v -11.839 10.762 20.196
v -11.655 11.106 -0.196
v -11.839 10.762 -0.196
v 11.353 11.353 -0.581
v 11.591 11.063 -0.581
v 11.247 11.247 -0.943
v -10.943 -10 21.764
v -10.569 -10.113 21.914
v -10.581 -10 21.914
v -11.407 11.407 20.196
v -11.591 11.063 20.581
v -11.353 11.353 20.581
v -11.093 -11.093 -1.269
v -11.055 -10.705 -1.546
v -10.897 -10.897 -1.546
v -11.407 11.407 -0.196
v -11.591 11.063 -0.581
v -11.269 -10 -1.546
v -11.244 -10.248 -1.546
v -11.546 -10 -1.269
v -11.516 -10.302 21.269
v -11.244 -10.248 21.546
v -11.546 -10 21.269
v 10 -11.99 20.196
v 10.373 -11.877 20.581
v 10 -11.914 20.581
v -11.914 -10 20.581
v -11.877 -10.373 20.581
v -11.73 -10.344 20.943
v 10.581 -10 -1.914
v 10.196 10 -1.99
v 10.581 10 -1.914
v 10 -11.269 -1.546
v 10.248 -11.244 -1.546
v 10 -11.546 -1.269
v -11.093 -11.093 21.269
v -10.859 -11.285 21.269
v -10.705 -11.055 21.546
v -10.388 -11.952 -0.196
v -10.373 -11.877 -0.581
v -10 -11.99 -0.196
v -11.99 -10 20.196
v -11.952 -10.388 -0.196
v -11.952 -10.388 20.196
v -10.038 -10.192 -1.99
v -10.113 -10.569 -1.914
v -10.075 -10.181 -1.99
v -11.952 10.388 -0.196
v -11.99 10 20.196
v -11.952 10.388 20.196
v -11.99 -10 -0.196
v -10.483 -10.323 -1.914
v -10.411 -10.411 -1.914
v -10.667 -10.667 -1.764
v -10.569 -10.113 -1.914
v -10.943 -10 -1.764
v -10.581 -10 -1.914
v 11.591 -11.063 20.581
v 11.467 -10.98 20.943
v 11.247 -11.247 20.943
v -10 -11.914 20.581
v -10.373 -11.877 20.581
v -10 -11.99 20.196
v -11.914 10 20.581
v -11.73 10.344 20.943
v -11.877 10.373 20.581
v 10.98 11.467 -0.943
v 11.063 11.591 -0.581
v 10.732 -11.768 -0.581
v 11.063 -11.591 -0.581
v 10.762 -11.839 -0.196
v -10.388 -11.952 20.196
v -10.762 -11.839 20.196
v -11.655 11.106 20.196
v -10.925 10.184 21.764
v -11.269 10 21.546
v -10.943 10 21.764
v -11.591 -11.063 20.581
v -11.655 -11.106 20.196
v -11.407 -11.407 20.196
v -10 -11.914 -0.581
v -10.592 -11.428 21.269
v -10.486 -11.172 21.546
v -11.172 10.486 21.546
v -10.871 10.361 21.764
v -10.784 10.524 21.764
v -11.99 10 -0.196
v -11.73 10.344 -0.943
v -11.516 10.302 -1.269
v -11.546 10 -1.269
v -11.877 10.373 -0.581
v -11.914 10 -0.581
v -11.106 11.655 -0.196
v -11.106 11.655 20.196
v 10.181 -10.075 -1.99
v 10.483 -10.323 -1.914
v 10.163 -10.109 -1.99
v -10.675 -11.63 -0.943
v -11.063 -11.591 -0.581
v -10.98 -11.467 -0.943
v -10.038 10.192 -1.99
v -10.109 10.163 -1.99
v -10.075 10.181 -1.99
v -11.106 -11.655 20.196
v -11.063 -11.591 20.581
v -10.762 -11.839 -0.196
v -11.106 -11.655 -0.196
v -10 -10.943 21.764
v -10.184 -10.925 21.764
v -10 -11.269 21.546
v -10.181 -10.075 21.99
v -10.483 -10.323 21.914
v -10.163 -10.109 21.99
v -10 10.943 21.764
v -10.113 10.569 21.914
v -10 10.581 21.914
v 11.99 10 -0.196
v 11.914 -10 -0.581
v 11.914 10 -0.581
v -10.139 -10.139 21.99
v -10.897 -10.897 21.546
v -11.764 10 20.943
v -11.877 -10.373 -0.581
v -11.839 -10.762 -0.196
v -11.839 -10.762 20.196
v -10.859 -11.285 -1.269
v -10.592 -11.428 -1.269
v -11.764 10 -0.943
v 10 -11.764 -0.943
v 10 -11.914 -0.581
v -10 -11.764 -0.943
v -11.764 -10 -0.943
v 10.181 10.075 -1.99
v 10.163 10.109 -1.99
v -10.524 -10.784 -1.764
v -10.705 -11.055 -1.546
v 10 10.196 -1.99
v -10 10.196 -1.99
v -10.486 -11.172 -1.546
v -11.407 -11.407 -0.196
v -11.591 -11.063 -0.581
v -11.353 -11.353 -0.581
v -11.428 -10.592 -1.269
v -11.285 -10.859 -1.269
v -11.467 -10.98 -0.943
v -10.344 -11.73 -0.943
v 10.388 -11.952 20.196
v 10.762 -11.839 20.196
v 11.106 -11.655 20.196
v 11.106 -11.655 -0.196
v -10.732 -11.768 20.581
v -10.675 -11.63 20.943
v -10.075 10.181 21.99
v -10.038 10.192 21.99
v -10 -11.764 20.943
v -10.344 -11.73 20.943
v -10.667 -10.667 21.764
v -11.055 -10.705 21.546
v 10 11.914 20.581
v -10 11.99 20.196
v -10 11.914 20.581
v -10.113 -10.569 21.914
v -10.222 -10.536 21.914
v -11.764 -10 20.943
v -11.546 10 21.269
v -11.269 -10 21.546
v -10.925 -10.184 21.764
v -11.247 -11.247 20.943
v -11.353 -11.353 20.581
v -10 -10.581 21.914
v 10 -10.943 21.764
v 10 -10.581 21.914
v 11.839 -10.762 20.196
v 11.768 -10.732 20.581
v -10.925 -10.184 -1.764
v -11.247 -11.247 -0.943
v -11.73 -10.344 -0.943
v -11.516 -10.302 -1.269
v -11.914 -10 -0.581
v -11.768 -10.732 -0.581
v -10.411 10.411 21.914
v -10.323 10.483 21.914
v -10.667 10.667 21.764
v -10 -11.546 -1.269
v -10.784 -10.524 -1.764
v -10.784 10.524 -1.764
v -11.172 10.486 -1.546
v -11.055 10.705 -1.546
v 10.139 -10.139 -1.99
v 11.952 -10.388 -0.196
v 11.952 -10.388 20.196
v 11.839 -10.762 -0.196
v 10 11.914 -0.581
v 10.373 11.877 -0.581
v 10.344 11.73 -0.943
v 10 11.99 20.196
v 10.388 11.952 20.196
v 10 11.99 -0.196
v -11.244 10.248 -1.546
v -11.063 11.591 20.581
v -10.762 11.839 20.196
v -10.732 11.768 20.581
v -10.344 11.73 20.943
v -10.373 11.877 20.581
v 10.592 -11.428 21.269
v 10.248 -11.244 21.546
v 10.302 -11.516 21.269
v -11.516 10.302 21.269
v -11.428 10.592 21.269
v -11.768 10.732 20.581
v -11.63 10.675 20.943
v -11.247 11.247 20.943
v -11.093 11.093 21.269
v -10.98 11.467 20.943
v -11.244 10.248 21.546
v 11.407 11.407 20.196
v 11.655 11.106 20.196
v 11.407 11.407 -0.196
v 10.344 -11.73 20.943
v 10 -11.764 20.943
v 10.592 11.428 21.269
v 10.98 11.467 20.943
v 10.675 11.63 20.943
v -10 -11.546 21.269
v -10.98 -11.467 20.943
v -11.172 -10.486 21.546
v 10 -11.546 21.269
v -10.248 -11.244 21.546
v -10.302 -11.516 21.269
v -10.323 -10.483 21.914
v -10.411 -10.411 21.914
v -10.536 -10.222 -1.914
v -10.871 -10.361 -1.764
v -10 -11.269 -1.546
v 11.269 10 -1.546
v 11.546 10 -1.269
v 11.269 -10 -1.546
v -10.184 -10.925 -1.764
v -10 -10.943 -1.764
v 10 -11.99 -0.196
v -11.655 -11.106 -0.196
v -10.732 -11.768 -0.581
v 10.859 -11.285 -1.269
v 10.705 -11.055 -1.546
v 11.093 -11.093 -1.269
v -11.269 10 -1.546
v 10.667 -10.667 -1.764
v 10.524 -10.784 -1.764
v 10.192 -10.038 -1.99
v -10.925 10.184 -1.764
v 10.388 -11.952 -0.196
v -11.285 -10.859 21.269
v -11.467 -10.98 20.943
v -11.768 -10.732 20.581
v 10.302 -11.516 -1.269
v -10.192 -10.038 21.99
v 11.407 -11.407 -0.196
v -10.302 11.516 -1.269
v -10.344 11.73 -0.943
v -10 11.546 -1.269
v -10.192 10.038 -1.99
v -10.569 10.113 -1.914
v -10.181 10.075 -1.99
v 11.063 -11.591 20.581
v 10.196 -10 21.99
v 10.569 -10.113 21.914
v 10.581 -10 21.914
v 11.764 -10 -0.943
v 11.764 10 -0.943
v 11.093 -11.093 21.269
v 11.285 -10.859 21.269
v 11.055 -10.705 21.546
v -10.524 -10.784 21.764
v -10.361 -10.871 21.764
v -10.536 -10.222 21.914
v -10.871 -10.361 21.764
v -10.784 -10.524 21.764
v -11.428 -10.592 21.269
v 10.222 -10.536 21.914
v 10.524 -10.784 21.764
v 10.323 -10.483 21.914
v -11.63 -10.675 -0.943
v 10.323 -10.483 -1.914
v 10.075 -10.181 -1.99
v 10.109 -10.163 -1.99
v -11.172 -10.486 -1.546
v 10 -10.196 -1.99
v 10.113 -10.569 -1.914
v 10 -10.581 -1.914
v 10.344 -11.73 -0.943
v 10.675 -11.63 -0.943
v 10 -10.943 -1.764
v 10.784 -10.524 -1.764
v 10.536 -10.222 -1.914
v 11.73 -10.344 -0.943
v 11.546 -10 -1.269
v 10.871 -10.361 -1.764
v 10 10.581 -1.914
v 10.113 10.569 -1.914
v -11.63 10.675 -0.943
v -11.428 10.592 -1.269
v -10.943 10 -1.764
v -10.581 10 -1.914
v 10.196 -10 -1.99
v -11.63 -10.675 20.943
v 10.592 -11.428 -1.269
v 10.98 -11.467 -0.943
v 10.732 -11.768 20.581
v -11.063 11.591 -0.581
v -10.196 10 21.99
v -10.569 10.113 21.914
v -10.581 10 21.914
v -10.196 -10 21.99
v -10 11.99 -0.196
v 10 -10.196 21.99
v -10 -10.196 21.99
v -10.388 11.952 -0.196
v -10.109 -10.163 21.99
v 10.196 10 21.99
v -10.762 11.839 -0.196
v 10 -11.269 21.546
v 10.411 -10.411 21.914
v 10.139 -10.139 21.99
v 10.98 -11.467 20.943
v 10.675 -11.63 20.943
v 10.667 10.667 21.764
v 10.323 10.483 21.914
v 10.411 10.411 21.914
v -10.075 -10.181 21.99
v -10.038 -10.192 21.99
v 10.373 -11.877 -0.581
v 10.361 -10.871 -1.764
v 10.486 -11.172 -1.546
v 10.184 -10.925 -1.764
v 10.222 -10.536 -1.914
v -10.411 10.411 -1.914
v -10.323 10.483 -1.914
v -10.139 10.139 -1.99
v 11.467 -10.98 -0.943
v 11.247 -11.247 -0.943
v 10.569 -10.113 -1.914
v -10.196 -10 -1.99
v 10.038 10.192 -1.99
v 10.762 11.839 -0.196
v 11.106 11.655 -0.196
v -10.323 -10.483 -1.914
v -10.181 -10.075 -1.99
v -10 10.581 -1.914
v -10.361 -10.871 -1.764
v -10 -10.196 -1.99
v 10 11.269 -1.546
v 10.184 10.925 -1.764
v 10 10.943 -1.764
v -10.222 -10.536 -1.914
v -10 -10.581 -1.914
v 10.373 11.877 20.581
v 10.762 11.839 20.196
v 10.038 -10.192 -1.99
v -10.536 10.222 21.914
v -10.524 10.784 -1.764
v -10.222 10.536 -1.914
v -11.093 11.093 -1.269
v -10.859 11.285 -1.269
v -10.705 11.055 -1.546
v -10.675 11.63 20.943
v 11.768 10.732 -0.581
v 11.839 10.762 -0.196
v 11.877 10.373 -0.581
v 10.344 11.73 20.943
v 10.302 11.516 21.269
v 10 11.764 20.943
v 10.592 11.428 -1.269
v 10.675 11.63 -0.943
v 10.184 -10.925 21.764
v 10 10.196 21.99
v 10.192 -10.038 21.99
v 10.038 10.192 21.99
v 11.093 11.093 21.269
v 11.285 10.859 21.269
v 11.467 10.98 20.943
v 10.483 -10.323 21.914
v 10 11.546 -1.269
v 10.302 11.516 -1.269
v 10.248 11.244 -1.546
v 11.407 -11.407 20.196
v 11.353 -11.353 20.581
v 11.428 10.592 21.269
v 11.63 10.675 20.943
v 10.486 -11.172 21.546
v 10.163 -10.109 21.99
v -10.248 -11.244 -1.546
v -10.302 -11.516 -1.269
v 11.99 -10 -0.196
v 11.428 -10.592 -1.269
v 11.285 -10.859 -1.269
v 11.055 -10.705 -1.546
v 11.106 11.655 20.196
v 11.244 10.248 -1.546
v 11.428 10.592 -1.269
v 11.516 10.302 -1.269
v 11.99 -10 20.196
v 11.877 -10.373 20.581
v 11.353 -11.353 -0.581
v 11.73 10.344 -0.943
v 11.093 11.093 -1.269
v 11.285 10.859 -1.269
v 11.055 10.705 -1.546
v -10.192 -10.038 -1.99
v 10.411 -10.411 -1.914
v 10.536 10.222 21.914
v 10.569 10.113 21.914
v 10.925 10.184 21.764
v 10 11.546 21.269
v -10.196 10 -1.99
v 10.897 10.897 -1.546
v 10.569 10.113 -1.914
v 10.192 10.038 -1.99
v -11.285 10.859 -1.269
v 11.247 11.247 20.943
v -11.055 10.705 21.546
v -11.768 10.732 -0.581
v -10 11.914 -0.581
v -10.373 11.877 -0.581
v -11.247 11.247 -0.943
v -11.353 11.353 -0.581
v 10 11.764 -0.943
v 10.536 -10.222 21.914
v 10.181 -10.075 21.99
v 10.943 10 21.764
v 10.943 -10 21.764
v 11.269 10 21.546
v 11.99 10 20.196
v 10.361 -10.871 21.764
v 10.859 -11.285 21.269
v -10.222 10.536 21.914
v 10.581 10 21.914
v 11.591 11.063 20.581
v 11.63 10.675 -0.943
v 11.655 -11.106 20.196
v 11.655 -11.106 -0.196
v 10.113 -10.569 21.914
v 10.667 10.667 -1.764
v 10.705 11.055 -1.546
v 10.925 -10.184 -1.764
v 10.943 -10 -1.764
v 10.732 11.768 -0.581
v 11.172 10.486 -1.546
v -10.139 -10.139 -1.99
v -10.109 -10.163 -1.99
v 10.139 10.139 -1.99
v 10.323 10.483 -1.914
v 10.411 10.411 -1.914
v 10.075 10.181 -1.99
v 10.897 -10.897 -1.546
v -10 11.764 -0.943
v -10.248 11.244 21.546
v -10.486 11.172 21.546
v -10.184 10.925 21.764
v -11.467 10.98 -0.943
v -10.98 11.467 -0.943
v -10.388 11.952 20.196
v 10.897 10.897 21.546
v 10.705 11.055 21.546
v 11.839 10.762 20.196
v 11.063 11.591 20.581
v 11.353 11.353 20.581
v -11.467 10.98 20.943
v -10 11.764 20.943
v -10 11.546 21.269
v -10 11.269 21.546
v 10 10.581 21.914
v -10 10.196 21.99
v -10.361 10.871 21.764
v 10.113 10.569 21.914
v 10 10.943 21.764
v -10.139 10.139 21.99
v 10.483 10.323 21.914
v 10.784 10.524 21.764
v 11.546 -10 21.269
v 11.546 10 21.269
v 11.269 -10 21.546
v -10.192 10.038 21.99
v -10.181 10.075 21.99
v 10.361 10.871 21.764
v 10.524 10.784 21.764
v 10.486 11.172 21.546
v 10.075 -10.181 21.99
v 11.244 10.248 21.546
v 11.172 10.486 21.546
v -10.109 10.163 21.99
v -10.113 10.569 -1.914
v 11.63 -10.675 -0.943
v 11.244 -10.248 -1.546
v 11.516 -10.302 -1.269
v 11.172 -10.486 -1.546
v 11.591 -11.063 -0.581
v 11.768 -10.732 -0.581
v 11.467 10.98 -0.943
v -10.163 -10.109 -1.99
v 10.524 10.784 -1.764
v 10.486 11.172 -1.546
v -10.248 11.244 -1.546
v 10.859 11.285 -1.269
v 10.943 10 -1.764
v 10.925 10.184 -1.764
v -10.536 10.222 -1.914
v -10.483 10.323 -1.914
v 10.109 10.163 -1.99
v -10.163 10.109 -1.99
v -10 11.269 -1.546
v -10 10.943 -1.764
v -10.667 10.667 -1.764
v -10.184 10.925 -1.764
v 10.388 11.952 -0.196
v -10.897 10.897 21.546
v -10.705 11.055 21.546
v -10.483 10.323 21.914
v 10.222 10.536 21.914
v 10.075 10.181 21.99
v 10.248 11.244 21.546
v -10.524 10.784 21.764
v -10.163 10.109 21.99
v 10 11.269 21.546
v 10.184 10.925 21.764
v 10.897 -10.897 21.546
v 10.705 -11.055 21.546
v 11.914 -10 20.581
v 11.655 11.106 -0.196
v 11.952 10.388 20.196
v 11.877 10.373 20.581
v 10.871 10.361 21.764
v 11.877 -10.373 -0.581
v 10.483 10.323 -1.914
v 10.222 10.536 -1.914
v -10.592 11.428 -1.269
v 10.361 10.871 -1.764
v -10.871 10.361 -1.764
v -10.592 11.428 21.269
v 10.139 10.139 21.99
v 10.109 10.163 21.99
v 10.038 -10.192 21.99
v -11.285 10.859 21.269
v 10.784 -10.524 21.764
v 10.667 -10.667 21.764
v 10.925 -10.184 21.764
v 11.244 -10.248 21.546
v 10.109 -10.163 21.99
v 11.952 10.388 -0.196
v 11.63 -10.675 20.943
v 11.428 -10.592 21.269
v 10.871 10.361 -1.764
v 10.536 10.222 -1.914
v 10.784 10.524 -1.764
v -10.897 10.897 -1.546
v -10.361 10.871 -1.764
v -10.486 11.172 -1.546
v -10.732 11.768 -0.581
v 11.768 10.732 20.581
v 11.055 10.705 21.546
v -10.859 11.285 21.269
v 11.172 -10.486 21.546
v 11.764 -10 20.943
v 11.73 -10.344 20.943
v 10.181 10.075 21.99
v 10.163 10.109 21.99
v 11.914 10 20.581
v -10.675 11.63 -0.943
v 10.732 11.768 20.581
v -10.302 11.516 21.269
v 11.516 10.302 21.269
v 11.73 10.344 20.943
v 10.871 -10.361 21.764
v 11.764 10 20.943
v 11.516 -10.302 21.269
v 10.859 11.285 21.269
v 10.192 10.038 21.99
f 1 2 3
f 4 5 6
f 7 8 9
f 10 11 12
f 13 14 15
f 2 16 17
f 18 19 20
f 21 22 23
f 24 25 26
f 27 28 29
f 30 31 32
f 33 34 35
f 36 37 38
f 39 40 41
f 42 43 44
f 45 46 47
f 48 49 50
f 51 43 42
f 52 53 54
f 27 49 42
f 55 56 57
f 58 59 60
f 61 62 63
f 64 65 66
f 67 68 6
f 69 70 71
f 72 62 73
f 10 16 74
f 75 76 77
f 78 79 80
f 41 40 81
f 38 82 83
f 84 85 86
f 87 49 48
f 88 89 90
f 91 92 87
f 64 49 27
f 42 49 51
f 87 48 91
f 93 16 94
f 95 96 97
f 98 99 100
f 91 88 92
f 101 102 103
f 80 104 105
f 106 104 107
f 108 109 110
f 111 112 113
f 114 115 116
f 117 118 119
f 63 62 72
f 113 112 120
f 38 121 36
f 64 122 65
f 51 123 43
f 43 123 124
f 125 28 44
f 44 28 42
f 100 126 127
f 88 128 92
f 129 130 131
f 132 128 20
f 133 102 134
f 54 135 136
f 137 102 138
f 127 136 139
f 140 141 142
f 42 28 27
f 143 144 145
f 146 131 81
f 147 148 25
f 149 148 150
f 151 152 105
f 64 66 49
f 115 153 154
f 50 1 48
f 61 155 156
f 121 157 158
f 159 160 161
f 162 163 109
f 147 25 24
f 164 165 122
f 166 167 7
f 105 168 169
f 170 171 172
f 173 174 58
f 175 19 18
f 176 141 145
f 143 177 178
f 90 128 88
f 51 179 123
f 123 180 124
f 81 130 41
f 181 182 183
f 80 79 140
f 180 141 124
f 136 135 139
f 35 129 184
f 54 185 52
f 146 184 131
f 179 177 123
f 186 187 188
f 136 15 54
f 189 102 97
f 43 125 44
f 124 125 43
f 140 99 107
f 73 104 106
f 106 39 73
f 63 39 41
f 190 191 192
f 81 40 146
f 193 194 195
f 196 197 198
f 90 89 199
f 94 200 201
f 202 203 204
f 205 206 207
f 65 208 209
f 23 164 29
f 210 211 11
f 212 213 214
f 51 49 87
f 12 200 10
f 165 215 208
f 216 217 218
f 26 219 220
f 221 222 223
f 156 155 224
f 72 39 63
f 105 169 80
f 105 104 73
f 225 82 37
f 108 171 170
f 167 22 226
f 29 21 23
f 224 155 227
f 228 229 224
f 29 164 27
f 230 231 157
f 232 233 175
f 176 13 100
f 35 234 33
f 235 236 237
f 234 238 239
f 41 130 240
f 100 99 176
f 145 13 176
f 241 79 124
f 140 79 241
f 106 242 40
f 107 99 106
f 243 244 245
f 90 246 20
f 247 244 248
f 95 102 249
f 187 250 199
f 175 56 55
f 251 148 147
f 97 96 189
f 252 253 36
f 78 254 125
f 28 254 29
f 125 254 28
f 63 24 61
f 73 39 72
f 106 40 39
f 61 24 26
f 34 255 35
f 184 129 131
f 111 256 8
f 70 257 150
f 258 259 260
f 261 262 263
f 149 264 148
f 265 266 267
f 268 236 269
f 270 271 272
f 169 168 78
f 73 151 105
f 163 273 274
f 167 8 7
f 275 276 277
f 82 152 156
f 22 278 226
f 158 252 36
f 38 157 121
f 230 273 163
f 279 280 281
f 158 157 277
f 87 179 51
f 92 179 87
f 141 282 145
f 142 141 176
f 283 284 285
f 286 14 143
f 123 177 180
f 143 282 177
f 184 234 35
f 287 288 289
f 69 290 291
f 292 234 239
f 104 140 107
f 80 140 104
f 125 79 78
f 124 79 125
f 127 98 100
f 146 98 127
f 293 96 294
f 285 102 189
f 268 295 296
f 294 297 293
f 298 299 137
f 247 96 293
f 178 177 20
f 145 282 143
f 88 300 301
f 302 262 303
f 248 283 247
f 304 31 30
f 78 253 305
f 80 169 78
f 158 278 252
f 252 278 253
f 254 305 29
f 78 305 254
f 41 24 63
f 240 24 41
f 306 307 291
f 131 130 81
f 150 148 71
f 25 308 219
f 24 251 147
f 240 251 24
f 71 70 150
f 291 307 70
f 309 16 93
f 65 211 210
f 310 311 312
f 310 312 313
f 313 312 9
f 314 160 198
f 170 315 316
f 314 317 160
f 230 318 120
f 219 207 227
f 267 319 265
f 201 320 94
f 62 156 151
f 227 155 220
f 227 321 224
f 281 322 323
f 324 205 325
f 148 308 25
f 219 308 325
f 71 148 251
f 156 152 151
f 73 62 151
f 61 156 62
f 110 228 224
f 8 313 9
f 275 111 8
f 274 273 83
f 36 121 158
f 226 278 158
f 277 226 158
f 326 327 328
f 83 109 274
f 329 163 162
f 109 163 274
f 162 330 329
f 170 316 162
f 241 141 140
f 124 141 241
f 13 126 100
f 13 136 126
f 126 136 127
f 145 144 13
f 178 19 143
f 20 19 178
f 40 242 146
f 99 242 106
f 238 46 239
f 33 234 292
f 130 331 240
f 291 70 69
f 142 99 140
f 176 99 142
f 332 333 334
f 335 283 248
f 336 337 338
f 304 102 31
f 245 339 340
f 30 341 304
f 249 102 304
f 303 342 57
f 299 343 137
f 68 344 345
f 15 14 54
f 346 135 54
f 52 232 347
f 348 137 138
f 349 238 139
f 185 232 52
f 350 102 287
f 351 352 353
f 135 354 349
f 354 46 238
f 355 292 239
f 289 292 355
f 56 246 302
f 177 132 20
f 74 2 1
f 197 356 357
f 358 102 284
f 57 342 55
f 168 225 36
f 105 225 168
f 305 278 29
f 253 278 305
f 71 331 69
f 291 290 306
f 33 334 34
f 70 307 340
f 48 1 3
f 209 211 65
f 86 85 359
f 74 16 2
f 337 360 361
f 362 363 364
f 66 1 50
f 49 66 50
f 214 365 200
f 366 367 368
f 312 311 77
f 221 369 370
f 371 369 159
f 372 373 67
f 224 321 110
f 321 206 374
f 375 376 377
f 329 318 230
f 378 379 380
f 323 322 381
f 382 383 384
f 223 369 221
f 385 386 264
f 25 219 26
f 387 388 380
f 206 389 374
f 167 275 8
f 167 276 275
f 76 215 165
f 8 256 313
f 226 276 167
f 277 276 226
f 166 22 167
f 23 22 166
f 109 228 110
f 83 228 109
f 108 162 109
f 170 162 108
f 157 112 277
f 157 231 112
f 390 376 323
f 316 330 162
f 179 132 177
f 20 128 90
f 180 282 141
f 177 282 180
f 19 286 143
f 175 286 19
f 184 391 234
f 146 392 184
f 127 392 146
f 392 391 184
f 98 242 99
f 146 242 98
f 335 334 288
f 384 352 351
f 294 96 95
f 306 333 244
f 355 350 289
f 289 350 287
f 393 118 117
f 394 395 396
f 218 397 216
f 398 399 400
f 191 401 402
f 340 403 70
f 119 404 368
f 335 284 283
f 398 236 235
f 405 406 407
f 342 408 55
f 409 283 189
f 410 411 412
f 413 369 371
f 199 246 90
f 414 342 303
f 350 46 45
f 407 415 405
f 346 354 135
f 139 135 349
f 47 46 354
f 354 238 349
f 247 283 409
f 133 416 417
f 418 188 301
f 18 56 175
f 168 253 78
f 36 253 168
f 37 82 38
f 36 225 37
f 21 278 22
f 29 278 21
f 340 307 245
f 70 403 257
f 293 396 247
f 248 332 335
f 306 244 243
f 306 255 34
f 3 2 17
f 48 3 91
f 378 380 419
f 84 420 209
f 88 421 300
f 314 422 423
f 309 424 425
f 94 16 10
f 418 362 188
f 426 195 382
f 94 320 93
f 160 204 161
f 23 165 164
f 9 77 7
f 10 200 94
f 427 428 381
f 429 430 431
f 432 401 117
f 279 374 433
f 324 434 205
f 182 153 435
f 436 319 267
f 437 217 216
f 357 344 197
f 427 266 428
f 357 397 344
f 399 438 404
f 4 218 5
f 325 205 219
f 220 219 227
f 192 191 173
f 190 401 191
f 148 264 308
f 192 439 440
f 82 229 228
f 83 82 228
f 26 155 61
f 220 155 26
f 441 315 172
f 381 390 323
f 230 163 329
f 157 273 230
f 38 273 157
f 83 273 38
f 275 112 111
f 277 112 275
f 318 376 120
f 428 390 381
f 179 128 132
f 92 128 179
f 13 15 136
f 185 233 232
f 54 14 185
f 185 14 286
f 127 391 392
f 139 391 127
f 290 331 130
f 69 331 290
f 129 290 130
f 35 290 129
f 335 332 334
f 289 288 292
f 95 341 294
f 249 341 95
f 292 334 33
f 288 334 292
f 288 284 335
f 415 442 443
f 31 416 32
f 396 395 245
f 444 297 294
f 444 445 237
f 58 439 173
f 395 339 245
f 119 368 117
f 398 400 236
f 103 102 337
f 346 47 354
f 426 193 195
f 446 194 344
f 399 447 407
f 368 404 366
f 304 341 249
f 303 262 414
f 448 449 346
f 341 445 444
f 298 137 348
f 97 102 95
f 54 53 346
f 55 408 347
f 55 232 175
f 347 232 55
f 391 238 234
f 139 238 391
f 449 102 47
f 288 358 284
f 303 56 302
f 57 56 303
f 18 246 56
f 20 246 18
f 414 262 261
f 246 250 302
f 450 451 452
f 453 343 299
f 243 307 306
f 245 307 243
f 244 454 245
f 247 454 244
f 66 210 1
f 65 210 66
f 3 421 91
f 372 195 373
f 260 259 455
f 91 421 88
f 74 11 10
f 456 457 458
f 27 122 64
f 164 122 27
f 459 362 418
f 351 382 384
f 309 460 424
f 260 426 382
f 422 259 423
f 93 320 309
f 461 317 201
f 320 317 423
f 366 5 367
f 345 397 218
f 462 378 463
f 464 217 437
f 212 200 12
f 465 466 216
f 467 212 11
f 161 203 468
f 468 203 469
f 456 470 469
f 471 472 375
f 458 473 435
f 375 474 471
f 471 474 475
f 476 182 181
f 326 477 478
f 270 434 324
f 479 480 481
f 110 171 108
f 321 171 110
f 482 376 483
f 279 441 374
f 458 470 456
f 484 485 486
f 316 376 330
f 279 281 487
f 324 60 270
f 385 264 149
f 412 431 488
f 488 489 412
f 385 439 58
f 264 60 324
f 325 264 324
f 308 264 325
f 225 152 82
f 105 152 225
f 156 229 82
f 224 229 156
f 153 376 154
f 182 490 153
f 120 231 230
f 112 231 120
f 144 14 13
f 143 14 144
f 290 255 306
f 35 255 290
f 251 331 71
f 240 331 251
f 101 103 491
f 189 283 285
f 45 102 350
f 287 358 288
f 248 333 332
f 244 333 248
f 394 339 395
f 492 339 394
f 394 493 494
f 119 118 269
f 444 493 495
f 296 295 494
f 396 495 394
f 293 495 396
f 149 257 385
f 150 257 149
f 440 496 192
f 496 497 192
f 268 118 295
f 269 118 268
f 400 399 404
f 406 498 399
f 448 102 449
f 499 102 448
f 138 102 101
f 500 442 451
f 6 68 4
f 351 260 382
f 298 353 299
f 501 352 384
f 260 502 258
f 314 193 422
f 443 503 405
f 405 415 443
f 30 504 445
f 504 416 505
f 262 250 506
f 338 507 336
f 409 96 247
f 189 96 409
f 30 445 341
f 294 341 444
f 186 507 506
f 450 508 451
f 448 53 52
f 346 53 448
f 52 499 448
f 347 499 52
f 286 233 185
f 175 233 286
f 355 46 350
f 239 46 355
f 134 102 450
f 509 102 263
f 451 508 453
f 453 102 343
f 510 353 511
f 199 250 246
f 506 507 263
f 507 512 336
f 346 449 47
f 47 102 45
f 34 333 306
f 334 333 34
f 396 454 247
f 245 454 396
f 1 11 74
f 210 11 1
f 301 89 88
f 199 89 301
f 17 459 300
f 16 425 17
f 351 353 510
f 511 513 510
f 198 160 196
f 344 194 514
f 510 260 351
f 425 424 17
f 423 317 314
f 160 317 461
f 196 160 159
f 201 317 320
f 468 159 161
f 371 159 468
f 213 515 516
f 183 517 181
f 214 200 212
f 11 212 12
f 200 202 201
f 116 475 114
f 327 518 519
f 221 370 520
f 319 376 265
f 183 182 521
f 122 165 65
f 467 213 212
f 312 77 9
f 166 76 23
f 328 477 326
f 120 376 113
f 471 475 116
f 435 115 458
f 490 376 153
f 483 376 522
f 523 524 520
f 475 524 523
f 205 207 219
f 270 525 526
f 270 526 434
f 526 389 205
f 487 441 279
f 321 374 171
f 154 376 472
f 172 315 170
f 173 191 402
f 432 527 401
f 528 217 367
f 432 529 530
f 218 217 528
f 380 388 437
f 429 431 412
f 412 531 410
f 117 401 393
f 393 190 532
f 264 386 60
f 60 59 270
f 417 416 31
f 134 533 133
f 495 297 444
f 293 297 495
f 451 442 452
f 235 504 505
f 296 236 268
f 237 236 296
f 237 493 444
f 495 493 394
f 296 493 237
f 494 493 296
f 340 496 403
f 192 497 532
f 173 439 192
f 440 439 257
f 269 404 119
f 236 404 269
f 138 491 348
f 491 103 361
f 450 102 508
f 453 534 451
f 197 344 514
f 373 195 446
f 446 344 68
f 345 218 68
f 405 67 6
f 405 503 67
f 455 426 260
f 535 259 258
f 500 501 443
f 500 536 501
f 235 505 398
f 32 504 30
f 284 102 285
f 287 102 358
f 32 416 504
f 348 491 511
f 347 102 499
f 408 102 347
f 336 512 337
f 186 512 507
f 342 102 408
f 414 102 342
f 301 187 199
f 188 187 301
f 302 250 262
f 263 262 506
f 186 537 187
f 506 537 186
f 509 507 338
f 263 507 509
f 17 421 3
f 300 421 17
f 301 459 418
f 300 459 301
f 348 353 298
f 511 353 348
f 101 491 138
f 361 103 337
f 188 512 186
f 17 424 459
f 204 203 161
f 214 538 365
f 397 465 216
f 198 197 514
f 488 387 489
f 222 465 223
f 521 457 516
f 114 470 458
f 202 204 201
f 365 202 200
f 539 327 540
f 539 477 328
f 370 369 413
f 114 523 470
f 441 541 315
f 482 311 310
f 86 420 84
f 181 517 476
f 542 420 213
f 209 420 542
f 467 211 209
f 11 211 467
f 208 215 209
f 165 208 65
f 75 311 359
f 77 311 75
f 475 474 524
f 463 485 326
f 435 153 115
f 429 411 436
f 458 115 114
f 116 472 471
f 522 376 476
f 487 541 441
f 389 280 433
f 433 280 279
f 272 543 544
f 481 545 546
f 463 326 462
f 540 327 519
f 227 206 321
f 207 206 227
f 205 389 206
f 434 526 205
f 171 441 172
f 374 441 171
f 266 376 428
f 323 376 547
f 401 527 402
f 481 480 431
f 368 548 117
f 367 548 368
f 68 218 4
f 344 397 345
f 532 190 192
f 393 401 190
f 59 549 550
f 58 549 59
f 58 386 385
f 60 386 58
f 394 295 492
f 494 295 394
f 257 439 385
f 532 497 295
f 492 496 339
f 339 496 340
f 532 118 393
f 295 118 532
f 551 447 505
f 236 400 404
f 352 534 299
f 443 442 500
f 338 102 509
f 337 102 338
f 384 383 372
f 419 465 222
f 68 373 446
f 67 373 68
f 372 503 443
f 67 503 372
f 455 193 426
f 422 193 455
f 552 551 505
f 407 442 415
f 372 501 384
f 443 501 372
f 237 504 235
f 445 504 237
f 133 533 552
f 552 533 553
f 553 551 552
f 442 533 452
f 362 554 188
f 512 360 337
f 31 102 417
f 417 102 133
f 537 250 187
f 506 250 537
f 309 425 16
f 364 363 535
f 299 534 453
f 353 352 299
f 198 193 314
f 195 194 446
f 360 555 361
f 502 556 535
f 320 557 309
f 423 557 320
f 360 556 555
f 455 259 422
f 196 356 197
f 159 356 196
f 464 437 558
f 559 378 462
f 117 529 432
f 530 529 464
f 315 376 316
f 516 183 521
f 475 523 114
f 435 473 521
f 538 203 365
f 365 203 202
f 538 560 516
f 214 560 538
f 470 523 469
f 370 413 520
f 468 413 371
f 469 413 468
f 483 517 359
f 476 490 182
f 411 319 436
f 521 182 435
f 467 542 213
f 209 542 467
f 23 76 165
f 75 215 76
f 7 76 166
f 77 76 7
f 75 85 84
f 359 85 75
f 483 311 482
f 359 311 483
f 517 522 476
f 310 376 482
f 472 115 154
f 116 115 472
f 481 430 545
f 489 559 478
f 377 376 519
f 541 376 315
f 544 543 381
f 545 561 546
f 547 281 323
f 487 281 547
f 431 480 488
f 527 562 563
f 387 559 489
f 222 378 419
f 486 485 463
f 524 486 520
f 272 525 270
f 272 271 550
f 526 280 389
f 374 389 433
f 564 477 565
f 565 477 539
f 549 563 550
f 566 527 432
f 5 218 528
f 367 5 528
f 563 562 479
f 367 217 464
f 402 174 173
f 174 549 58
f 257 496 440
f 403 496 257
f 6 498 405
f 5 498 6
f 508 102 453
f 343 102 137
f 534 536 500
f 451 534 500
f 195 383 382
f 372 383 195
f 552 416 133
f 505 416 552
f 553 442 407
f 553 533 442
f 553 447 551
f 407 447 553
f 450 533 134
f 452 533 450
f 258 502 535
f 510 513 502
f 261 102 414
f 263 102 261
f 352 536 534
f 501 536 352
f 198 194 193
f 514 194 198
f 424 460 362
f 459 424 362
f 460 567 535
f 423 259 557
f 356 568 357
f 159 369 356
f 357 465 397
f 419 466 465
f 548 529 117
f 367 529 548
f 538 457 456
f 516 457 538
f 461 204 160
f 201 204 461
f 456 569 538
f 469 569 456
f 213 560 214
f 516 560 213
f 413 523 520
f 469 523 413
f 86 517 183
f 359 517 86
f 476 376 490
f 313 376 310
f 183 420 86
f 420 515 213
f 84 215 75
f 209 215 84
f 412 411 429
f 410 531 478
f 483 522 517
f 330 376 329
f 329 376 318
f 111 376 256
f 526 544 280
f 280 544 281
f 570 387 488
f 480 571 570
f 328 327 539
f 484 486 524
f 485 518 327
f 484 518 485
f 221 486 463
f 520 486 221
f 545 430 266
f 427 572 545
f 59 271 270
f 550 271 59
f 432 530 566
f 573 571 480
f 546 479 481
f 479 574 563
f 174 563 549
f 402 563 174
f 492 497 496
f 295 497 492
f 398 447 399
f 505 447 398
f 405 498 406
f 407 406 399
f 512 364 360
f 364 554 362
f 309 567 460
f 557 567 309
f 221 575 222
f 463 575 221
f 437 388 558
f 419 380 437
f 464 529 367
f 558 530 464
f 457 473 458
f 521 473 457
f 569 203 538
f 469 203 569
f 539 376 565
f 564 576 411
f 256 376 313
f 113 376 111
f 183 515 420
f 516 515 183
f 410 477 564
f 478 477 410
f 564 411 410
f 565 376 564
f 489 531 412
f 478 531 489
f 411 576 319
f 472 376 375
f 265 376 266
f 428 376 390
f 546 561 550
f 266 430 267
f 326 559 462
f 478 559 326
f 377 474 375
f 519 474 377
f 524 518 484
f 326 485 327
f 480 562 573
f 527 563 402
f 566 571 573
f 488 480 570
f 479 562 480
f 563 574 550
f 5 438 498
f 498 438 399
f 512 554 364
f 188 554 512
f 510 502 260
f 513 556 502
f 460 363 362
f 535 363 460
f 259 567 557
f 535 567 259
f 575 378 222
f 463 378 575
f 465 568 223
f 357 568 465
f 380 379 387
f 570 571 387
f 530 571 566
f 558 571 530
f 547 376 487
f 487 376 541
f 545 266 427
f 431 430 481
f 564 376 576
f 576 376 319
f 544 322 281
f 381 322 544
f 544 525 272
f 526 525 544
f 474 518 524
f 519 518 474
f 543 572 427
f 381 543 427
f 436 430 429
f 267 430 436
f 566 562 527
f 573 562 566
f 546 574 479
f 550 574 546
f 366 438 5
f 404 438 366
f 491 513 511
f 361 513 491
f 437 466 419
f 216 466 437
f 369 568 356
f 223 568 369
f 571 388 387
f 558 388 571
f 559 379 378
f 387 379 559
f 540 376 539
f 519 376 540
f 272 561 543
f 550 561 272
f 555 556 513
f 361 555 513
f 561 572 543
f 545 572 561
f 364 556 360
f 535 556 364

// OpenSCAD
// Example: Beveled Cube via hull
$fn=32;
hull() {
    translate([-10,-10,0])  sphere(r=2);
    translate([ 10,-10,0])  sphere(r=2);
    translate([-10, 10,0])  sphere(r=2);
    translate([ 10, 10,0])  sphere(r=2);
    translate([-10,-10,20]) sphere(r=2);
    translate([ 10,-10,20]) sphere(r=2);
    translate([-10, 10,20]) sphere(r=2);
    translate([ 10, 10,20]) sphere(r=2);
}
